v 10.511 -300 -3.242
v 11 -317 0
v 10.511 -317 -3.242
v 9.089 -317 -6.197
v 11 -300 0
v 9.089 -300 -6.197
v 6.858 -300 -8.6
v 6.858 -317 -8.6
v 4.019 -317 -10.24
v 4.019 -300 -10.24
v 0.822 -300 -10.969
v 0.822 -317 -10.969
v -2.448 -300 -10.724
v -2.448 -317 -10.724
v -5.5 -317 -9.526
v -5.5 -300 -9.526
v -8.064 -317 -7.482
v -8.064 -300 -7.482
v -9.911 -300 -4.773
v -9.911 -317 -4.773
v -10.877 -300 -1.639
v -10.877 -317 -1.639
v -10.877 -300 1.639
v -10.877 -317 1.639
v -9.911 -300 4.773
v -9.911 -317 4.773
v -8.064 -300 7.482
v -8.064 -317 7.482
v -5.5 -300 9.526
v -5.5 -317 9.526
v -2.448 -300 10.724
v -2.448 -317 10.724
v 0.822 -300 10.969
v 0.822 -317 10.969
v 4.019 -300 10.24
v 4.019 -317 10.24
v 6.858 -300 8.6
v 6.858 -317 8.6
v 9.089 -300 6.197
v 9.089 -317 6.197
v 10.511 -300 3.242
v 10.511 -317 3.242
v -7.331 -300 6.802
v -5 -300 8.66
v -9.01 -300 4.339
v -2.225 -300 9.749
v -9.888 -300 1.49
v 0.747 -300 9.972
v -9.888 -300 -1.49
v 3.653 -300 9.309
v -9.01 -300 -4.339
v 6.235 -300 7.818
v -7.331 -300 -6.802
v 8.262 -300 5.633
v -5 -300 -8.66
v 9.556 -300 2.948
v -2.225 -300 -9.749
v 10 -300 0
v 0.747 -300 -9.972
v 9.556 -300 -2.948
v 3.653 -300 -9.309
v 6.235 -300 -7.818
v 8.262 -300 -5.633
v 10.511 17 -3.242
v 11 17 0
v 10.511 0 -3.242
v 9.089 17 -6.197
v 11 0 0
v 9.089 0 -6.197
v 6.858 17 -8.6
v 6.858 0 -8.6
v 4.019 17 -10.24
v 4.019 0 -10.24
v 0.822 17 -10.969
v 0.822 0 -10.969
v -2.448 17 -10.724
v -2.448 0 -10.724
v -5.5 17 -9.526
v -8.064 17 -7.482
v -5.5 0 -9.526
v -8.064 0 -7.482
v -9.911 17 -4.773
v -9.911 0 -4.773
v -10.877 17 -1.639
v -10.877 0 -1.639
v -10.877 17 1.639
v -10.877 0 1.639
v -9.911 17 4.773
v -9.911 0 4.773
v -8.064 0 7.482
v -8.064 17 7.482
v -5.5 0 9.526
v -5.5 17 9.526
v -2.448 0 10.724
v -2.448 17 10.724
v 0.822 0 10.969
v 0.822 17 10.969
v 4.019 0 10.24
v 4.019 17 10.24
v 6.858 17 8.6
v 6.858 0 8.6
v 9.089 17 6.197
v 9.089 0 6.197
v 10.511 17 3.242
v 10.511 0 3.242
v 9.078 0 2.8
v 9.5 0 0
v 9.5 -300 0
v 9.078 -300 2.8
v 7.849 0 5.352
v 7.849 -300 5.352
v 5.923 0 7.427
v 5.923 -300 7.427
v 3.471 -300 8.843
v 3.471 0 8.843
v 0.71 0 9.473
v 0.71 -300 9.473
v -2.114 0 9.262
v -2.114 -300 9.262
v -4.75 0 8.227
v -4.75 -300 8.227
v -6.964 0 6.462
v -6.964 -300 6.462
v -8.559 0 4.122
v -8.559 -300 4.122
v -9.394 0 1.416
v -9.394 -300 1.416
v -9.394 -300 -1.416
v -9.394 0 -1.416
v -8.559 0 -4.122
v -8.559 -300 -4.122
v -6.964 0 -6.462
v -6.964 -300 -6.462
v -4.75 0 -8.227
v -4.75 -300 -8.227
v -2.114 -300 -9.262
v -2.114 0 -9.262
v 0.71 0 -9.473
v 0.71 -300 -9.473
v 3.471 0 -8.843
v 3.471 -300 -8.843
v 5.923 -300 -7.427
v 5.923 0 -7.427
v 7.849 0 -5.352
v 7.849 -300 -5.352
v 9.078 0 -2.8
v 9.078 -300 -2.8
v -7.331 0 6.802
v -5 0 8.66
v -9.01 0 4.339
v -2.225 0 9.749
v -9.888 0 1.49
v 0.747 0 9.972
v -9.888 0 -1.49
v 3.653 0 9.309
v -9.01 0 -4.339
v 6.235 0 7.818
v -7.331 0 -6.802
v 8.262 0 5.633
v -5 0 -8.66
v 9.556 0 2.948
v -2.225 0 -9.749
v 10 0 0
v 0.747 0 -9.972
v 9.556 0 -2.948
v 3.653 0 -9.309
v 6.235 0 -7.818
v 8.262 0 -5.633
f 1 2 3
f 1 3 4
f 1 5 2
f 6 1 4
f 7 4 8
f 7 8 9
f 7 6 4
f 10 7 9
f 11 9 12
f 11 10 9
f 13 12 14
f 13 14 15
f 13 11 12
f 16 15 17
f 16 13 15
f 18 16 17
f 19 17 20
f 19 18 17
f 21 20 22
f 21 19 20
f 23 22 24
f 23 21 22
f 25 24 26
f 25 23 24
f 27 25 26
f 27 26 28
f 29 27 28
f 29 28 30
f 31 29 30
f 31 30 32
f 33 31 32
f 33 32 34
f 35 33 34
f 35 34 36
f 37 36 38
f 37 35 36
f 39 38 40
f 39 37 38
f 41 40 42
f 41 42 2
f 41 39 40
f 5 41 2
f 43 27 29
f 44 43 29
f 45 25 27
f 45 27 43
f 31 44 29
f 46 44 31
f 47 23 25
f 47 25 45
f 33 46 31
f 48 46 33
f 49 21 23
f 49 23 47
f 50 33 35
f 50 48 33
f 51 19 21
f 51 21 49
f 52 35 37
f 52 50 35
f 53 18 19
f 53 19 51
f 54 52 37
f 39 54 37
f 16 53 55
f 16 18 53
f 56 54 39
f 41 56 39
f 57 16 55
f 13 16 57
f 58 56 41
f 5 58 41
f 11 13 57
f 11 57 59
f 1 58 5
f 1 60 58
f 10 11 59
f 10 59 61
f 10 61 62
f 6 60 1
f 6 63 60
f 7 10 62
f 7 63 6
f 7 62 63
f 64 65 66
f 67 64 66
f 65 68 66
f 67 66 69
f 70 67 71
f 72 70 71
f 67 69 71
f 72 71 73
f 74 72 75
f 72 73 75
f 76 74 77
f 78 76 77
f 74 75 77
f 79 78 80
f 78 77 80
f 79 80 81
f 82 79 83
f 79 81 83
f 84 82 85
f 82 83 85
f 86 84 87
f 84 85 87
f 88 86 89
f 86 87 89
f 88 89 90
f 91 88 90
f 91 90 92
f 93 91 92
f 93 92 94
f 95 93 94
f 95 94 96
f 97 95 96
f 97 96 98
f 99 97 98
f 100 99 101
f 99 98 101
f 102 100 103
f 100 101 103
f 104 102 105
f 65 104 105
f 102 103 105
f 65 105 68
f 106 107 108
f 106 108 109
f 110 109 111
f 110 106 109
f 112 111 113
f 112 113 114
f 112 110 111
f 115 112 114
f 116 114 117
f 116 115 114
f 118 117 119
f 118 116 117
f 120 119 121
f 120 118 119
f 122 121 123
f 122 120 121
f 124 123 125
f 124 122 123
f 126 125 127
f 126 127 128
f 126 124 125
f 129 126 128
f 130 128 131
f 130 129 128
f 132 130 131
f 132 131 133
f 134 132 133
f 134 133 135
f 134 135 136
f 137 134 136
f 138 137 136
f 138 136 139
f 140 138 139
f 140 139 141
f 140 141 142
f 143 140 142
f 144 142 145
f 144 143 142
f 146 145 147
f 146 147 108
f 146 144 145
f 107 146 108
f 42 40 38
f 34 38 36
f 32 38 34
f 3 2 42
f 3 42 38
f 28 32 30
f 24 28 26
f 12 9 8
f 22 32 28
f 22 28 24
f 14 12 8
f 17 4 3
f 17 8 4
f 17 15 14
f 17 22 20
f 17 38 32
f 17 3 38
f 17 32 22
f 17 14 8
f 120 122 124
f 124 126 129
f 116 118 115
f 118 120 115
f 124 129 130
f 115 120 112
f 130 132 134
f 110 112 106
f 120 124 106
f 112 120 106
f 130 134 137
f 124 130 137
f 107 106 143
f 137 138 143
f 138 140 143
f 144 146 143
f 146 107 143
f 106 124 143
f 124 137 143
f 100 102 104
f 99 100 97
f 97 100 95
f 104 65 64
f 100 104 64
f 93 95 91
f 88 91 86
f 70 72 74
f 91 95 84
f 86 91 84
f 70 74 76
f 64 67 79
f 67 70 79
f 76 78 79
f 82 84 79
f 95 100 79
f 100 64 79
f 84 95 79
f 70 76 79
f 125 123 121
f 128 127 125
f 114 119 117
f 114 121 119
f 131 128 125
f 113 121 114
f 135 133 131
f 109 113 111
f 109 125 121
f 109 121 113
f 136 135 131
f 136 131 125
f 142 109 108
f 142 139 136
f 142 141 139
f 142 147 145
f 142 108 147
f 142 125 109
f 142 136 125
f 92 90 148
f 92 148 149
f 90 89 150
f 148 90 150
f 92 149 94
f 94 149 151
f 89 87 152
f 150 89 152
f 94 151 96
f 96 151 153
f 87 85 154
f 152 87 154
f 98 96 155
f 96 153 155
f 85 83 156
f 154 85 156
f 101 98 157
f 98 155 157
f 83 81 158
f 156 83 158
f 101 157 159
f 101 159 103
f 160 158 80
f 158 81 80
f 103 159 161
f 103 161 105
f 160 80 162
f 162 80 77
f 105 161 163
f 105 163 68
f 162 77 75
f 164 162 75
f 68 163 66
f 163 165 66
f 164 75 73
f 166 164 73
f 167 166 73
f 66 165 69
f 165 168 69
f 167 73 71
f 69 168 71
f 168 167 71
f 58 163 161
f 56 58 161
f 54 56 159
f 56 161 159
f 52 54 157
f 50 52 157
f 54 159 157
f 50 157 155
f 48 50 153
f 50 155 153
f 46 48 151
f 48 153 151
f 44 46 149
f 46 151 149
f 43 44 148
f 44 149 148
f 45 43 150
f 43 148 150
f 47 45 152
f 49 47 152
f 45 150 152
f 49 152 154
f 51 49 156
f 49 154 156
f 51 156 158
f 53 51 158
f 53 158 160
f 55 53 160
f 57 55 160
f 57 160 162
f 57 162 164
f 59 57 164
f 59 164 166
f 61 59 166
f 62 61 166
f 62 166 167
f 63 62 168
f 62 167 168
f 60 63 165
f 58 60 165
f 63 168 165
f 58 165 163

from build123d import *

# Parameters (mm, degrees)
F0_R     = 10
F0_R_2   = 9.5
F1_DEPTH = 300


with BuildPart() as f1:
    # F0 (on Front) → F1 (new body)
    with BuildSketch(Plane.XZ):
        Circle(F0_R)
        Circle(F0_R_2, mode=Mode.SUBTRACT)
    extrude(amount=F1_DEPTH)

    # F2 (on Top) → F3 (revolve)
    with BuildSketch(Plane.XY):
        Polygon((11, -300), (0, -300), (0, -317), (1.930615992, -317), (11, -317), align=None)
    revolve(axis=Axis((0, -515.2761181587, 0), (0, 1, 0)))

    # F5: F1 across plane


with BuildPart() as f1_1:
    add(f1.part)
    add(f1.part.mirror(Plane(origin=(0, -150, 0), x_dir=(1, 0, 0), z_dir=(0, 1, 0))))


solid = f1_1.part
